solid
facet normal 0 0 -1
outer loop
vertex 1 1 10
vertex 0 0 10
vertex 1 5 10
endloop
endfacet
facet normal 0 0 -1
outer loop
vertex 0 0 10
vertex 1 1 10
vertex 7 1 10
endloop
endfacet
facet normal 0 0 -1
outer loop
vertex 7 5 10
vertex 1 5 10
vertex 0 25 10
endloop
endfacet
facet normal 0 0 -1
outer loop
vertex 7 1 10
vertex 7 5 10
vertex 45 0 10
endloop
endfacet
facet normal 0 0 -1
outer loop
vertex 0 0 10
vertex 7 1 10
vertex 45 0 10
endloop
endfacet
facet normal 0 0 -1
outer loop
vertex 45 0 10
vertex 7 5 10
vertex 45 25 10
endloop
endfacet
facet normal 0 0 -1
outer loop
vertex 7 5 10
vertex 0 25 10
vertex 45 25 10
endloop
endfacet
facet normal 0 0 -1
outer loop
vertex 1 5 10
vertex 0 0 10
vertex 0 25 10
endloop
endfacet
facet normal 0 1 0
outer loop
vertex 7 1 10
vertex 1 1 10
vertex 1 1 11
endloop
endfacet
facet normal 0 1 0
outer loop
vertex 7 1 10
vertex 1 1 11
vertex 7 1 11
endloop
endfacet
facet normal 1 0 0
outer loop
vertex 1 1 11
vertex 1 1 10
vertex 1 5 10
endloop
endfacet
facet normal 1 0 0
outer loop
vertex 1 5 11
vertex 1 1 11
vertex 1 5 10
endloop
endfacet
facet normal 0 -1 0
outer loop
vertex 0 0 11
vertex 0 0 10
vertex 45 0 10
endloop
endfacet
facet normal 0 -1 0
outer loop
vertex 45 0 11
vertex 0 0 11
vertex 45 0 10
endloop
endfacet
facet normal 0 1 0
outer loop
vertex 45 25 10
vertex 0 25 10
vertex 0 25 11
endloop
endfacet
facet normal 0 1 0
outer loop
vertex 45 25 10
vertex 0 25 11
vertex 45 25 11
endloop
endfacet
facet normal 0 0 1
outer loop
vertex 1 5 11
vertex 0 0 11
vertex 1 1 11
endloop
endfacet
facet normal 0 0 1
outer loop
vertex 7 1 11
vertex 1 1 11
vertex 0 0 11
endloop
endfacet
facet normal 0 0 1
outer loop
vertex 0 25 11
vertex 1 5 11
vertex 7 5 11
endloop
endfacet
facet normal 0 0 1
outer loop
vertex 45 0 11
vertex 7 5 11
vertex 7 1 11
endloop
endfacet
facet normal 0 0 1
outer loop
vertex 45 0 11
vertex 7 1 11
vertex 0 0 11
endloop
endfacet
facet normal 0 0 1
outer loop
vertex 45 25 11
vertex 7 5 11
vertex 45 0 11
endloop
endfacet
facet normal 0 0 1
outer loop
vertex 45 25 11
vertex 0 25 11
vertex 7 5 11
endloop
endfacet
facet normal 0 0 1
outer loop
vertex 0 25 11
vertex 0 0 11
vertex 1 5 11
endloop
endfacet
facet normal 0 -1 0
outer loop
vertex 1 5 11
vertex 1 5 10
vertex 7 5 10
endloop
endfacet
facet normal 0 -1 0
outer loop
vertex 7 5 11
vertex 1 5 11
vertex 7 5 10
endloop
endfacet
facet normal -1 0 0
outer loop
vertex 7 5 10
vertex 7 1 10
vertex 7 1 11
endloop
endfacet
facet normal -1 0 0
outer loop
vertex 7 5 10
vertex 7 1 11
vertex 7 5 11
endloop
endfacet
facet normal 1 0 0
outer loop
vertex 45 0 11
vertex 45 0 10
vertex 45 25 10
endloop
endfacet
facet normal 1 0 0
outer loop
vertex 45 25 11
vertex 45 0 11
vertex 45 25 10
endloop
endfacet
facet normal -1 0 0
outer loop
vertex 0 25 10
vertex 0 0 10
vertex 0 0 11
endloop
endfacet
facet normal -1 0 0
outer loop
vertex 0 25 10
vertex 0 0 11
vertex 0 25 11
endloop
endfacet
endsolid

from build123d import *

# Parameters (mm, degrees)
BOX036_W     = 6
BOX036_H     = 4
BOX036_DEPTH = 1
BOX027_W     = 45
BOX027_H     = 25
BOX027_DEPTH = 1


with BuildPart() as box036:
    # Box036 → Box036 (new body)
    with BuildSketch(Plane(origin=(1, 1, 10), x_dir=(1, 0, 0), z_dir=(0, 0, 1))):
        with Locations((3, 2)):
            Rectangle(BOX036_W, BOX036_H)
    extrude(amount=BOX036_DEPTH)


with BuildPart() as cut038:
    # Box027 → Box027 (new body)
    with BuildSketch(Plane.XY.offset(10)):
        with Locations((22.5, 12.5)):
            Rectangle(BOX027_W, BOX027_H)
    extrude(amount=BOX027_DEPTH)

    # Cut038: cut Box036
    add(box036.part, mode=Mode.SUBTRACT)


solid = cut038.part
